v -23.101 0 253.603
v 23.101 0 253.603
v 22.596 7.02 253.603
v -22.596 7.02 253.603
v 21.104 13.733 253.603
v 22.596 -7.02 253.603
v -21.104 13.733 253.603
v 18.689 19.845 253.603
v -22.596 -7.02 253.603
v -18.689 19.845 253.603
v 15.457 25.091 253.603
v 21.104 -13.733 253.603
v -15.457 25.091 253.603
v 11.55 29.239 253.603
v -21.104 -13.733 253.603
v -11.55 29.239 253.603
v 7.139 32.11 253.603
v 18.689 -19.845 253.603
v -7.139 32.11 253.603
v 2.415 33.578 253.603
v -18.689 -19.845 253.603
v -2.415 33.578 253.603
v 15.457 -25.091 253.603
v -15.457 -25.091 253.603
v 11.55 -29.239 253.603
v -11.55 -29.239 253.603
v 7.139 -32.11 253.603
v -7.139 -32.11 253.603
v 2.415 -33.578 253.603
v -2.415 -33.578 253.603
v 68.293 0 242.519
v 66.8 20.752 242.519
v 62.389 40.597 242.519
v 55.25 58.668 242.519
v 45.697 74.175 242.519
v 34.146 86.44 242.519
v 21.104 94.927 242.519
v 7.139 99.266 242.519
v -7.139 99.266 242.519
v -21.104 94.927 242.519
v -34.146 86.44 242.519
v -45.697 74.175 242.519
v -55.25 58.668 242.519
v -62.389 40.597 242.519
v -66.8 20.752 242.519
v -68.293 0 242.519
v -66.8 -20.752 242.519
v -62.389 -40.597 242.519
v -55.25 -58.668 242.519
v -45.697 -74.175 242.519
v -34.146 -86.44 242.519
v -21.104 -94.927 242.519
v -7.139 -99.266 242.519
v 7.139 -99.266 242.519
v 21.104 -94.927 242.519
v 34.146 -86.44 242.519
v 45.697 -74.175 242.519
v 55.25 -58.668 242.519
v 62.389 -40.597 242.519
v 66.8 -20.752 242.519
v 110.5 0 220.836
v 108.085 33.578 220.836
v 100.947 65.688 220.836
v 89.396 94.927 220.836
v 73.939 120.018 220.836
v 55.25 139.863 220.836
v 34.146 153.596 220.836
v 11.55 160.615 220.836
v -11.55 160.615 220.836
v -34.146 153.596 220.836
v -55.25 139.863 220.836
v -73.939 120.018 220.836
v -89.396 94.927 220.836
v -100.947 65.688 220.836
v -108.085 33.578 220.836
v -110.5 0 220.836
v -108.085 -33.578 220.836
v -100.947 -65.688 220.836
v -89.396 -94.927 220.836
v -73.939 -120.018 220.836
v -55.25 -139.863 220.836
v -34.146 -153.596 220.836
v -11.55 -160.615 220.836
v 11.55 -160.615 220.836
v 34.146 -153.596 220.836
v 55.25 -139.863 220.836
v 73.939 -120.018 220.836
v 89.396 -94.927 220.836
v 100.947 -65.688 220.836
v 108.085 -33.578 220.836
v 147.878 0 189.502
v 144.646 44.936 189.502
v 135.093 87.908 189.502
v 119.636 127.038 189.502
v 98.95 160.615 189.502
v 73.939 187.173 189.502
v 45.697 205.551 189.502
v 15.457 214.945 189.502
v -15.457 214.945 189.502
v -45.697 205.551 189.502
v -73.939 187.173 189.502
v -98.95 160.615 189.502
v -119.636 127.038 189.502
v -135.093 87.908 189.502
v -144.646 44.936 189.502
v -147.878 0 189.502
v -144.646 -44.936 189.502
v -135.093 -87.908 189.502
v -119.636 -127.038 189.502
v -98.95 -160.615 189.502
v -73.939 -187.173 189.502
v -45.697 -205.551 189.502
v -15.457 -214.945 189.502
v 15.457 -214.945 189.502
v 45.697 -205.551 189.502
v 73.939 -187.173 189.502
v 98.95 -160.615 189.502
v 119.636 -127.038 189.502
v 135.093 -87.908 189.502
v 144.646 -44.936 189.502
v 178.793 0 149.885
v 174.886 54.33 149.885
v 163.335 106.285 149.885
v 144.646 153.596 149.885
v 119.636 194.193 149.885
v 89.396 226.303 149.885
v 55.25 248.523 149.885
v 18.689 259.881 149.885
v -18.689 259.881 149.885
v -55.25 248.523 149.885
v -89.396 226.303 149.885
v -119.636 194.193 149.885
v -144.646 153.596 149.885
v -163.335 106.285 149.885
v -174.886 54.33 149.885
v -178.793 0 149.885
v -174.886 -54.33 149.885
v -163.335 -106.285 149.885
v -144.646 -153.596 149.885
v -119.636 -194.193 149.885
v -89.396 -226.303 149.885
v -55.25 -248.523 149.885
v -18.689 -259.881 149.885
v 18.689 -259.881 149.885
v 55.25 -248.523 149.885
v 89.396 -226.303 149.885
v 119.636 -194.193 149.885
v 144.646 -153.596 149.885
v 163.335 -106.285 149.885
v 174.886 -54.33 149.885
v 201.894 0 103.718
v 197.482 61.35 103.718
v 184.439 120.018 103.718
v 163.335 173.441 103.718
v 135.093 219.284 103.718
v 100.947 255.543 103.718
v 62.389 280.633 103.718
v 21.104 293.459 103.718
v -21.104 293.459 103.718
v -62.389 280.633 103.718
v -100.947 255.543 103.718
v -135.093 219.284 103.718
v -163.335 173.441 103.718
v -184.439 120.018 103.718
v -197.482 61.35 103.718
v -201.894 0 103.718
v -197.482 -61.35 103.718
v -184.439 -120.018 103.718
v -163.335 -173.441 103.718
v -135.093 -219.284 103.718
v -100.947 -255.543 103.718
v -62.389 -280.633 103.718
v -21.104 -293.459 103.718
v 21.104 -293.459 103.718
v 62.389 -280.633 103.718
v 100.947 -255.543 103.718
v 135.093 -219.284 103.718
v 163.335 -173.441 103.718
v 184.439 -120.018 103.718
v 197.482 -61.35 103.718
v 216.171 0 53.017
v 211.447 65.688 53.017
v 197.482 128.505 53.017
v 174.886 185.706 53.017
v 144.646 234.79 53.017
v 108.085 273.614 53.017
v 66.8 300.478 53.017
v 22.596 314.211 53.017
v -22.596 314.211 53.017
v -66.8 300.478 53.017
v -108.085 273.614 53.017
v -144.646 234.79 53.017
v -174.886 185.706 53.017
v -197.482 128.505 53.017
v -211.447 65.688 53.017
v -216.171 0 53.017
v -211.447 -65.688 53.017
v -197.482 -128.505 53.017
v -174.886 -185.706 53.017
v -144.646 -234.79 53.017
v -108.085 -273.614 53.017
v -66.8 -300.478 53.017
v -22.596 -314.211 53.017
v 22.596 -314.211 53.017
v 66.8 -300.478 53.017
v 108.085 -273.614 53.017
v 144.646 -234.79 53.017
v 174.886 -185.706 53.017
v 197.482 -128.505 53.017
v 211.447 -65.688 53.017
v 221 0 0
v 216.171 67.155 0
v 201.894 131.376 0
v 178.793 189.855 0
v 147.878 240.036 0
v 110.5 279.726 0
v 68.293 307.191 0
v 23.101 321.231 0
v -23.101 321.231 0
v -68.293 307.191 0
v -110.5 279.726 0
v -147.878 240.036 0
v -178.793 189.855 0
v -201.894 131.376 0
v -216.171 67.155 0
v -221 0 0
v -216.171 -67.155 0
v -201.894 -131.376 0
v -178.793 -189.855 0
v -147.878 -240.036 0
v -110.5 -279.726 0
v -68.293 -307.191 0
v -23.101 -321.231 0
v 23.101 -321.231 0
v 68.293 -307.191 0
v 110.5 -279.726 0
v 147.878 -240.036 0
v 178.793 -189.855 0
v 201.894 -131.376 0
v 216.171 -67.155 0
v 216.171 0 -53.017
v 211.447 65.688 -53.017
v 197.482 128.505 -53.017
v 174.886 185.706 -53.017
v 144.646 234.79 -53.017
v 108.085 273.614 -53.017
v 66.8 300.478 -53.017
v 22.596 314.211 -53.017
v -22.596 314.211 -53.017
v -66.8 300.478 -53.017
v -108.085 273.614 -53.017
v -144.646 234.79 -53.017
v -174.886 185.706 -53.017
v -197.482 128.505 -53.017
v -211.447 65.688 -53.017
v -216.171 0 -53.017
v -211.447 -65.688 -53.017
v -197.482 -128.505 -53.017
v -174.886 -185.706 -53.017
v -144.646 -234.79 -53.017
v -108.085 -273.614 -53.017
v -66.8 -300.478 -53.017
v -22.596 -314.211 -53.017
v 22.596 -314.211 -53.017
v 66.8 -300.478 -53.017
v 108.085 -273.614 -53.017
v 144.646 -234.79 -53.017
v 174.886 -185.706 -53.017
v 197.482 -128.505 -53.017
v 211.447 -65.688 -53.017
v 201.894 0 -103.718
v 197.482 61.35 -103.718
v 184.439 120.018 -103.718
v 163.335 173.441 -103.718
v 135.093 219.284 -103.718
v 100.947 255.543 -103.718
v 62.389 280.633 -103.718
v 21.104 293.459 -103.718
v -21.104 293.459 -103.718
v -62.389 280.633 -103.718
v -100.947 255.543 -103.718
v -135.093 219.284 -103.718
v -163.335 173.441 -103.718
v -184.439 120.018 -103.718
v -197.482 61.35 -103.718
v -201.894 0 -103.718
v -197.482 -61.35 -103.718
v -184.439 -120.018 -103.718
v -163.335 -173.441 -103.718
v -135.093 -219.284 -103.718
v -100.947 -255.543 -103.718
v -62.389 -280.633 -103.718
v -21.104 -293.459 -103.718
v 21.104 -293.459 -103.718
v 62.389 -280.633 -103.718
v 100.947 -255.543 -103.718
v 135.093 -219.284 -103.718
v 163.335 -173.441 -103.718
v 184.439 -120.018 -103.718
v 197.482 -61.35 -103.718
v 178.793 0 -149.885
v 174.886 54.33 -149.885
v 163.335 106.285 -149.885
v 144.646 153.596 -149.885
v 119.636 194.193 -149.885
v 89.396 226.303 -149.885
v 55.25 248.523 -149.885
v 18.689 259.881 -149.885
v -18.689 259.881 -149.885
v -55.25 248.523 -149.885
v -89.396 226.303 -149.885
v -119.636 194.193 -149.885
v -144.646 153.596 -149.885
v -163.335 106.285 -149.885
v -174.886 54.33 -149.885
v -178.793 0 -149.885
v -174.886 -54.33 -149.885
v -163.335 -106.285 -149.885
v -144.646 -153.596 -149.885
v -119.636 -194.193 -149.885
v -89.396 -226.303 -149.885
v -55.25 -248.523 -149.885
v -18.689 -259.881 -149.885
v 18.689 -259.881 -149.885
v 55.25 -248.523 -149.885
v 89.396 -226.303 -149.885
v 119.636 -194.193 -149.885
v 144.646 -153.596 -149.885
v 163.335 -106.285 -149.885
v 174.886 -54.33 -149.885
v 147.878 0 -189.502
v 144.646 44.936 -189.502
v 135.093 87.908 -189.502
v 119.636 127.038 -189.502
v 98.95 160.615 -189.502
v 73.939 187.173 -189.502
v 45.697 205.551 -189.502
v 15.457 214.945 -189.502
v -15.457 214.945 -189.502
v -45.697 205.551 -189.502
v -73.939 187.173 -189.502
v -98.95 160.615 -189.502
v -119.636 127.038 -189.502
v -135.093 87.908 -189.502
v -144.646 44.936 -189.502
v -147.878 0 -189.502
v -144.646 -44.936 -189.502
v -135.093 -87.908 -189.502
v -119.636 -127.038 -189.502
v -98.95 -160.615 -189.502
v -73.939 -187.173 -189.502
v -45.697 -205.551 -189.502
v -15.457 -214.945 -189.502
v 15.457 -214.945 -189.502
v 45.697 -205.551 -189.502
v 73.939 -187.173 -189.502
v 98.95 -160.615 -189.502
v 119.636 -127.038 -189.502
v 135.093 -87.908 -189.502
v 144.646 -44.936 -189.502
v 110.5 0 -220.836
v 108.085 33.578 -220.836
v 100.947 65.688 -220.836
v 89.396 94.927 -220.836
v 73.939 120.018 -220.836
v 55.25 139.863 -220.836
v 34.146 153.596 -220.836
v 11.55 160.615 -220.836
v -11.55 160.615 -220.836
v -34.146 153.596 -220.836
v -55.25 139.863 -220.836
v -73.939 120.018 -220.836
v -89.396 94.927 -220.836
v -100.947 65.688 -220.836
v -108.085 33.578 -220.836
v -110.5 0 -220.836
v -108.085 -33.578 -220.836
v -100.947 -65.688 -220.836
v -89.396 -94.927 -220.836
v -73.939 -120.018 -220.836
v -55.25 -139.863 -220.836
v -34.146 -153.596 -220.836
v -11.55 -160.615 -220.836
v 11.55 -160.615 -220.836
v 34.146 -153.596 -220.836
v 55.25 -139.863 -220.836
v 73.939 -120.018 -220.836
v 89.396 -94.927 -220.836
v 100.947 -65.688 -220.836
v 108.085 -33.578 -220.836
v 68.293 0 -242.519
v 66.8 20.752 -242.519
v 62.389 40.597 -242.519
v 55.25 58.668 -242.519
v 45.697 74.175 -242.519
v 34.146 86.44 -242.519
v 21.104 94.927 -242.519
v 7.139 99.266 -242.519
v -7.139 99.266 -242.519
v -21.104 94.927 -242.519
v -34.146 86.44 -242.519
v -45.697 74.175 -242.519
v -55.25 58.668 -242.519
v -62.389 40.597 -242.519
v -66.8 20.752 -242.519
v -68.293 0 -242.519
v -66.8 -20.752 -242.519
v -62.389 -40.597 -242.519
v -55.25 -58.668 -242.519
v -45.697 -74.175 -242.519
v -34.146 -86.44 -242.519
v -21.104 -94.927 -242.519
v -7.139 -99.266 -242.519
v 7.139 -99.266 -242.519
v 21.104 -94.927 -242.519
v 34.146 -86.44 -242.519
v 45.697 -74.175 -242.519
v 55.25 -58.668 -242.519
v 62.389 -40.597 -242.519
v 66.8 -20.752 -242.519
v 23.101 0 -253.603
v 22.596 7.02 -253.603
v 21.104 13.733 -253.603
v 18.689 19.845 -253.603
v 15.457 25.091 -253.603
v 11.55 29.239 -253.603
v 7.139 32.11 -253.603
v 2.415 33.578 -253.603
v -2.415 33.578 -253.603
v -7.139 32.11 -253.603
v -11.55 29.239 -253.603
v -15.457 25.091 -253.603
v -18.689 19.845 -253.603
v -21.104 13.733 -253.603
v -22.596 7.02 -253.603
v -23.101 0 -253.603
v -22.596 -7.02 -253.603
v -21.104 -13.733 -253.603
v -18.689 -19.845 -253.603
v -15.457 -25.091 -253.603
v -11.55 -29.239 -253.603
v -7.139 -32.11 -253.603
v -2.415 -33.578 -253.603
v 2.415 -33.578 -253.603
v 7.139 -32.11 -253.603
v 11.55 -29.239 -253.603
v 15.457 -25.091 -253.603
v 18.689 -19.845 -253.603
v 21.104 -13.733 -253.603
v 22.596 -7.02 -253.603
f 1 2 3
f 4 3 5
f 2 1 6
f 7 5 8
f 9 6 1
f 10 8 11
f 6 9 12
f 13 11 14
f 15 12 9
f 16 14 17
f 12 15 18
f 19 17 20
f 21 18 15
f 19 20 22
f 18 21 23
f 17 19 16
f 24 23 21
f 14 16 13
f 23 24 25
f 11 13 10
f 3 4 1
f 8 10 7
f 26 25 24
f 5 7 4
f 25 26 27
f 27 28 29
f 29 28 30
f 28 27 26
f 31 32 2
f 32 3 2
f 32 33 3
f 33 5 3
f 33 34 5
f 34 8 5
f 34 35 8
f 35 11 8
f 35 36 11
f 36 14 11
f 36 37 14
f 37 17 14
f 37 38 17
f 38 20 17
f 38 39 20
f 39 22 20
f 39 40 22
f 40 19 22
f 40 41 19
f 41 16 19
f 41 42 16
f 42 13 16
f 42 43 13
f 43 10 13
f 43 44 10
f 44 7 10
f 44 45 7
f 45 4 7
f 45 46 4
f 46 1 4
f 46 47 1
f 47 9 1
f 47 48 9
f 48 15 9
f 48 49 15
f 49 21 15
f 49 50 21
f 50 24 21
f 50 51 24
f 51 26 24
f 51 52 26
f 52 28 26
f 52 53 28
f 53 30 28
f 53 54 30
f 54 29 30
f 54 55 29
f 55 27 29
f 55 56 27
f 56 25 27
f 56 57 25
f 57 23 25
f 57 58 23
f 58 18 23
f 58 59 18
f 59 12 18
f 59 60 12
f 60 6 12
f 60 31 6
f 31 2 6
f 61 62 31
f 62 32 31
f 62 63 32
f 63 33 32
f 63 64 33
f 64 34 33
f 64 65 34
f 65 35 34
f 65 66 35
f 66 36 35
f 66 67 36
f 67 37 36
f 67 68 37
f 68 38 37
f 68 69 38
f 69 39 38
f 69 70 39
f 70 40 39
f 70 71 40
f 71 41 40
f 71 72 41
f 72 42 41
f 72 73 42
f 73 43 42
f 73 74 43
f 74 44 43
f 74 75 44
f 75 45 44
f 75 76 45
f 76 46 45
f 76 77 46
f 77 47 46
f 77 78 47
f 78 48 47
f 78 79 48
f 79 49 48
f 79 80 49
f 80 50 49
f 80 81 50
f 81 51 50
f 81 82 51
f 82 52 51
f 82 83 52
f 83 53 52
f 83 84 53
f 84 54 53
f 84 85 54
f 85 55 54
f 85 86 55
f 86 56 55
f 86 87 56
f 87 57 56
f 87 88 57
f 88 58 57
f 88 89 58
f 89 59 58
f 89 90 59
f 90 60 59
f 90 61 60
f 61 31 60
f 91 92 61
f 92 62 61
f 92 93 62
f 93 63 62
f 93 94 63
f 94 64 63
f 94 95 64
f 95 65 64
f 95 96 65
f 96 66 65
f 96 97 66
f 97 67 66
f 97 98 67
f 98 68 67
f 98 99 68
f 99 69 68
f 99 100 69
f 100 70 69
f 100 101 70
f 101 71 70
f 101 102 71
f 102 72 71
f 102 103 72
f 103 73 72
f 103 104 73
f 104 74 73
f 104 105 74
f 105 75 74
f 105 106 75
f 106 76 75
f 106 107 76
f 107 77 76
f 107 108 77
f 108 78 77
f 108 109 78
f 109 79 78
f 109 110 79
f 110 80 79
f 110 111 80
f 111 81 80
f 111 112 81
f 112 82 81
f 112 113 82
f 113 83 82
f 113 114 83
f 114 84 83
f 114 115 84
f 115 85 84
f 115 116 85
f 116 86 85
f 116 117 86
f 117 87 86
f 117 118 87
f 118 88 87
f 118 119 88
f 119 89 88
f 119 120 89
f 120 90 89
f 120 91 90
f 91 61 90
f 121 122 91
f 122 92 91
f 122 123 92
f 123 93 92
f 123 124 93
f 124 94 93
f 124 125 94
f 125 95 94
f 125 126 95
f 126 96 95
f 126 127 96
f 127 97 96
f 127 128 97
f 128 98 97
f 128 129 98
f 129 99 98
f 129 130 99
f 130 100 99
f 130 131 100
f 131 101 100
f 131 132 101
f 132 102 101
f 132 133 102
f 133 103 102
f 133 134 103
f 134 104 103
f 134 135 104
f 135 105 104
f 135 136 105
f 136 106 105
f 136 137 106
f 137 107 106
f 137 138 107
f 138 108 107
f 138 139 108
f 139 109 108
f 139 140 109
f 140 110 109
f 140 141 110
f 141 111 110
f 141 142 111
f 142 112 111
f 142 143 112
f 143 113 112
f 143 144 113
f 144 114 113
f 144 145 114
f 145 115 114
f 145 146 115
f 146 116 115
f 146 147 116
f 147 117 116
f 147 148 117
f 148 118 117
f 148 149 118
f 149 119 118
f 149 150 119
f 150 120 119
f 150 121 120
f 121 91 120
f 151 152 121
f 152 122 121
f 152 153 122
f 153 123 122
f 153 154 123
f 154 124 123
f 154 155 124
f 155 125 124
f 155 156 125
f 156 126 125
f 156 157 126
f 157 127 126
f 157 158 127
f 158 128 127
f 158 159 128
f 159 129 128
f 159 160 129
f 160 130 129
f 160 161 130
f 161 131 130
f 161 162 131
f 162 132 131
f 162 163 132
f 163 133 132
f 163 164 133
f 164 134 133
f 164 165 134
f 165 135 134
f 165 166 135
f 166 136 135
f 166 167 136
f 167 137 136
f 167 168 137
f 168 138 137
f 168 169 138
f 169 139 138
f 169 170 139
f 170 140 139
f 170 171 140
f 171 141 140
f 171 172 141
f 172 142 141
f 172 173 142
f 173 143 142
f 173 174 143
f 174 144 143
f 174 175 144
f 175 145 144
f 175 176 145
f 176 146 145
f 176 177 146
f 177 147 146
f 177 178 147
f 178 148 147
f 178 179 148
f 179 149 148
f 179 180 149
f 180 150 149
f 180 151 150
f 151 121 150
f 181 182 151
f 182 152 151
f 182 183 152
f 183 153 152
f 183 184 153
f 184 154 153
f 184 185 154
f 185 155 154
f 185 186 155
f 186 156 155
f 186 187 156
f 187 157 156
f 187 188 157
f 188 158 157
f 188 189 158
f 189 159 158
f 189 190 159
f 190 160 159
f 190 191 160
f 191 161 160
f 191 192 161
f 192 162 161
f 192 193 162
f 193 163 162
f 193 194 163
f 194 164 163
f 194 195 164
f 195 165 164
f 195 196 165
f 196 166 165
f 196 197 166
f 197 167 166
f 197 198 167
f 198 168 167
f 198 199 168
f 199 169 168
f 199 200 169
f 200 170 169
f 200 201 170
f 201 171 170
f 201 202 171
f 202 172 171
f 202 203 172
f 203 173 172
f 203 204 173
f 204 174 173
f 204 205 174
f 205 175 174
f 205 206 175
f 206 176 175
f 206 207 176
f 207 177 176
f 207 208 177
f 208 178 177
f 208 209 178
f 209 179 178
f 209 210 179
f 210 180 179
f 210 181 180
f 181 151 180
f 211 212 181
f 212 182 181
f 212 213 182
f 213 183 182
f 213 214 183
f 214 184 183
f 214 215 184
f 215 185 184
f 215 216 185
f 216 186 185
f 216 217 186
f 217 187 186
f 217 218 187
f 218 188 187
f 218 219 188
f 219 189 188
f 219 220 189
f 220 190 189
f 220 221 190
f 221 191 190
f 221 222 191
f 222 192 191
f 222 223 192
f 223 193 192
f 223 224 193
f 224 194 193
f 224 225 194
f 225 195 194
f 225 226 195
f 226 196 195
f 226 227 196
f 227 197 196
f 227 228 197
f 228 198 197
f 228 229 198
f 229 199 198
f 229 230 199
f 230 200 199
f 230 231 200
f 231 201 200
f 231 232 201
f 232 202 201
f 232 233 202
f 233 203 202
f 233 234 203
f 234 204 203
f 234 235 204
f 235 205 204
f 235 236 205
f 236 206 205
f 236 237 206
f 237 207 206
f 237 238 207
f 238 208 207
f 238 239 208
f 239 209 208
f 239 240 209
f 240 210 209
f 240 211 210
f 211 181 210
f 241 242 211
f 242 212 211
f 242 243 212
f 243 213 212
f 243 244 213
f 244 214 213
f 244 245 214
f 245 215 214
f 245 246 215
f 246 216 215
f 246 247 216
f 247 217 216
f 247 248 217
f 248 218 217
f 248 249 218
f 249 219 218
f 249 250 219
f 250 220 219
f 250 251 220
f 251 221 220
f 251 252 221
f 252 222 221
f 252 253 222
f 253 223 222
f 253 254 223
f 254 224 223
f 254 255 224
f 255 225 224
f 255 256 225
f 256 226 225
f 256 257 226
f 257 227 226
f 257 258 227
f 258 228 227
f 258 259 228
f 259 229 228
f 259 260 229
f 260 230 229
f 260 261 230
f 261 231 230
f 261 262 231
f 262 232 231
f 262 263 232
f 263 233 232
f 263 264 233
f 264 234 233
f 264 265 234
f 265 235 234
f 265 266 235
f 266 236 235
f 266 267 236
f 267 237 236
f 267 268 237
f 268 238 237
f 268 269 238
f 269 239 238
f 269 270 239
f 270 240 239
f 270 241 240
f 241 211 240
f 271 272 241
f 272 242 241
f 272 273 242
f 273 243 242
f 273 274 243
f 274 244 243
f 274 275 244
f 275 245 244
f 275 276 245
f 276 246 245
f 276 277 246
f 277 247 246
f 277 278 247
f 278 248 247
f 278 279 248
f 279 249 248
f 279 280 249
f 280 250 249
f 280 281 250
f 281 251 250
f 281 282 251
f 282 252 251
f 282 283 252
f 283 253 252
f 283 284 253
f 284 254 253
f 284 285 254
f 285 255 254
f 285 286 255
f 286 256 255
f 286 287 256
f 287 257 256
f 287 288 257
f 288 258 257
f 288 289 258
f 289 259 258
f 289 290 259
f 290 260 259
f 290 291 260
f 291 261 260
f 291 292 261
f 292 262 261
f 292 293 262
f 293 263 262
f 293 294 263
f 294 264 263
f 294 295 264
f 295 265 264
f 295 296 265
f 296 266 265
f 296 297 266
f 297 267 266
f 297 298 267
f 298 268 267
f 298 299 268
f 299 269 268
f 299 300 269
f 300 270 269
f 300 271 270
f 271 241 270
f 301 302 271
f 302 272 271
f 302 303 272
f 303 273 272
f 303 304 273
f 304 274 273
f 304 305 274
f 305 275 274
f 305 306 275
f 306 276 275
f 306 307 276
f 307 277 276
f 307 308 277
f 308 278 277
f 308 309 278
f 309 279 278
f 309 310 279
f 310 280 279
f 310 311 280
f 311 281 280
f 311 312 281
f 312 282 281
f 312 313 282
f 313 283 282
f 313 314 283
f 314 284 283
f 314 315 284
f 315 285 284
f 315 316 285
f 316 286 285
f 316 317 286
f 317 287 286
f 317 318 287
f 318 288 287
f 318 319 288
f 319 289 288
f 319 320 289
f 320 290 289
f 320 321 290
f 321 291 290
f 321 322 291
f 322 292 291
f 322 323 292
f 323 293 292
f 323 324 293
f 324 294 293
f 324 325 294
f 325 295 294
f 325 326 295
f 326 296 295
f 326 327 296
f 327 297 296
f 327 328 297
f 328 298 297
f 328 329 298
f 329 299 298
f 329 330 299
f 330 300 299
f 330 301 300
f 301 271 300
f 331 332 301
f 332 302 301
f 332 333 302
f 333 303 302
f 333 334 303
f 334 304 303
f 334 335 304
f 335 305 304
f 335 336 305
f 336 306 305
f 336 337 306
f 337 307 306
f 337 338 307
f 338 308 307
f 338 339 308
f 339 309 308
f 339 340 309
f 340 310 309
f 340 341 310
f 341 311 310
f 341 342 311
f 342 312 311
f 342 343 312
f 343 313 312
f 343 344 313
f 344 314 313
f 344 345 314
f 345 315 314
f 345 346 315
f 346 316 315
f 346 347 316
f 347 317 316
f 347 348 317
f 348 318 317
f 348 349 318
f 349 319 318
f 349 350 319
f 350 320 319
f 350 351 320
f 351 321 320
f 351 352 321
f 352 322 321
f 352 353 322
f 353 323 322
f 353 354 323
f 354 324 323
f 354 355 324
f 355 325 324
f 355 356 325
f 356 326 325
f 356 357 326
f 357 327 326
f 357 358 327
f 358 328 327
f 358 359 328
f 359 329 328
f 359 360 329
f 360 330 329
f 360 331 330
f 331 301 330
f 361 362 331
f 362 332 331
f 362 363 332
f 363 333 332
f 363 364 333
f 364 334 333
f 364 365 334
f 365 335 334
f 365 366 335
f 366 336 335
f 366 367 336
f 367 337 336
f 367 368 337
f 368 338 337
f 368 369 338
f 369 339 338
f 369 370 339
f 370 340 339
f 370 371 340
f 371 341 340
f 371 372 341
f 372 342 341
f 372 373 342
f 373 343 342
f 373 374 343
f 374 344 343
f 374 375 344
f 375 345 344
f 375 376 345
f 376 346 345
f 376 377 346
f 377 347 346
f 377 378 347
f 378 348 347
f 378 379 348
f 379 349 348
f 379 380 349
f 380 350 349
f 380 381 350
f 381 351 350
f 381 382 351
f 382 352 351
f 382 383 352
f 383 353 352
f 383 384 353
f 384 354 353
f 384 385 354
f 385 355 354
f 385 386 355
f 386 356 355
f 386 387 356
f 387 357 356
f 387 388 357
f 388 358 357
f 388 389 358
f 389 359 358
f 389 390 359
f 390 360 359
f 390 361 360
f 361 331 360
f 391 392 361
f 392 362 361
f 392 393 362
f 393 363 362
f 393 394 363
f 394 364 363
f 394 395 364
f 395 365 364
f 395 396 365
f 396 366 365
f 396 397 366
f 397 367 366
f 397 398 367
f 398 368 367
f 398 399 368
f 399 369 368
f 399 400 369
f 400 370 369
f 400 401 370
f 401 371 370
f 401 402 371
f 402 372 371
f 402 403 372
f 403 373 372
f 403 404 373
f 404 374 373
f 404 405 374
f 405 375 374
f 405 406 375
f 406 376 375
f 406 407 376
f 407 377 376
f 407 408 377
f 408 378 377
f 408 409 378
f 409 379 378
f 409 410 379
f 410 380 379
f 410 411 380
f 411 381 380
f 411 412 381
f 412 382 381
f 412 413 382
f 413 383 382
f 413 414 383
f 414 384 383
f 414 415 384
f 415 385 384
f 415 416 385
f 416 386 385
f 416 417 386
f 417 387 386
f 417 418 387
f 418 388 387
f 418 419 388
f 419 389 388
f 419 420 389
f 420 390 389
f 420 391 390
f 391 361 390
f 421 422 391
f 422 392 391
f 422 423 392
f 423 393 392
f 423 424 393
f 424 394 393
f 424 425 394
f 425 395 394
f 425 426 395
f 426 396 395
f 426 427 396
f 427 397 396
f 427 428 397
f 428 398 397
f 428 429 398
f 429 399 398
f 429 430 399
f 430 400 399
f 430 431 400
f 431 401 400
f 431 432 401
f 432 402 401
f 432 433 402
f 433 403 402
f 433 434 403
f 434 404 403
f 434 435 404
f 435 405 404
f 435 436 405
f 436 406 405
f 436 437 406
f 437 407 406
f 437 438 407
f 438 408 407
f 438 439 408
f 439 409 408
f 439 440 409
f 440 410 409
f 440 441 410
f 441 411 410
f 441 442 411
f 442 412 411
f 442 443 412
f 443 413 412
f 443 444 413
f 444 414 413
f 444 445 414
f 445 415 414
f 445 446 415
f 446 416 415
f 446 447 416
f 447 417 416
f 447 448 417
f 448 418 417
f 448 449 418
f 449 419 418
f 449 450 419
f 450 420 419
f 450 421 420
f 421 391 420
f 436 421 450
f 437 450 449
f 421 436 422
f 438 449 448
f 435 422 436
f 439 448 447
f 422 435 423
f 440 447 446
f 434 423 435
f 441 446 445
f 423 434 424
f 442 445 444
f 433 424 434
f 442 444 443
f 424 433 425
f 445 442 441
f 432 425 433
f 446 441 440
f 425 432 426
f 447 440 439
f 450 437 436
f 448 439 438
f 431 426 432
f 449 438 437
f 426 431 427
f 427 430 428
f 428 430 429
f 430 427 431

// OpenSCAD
// Generated by SolidPython 1.0.1 on 2020-07-29 00:46:51


scale(v = [13, 19, 15]) {
	sphere(r = 17);
}
/***********************************************
*********      SolidPython code:      **********
************************************************
 
# import packages: SolidPython
from solid import *
from solid.utils import *
from itertools import chain, combinations, permutations


class Resize:

    def __init__(self, scad_file):
        self.scad_file = scad_file
        #self.scad_file = import_scad(scad_file)
        # cone/cylinder param:
        self.r1 = 0
        self.r2 = 0
        self.h = 0
        # rectangular prism param:
        self.w = 0
        self.l = 0
        # ellipse param:
        self.r = 0

    # import OpenScad code (file name corresponds to shape)


    # classify shape + parameters
    def assign(self, param1, param2, param3):
        if self.scad_file == 'cone.scad':
            self.r1 = param1
            self.r2 = param2
            self.h = param3
        elif self.scad_file == 'cylinder.scad':
            self.r1 = param1
            self.r2 = param2
            self.h = param3
        elif self.scad_file == 'rectangularPrism.scad':
            self.h = param1
            self.l = param2
            self.w = param3
        else:
            self.r = param1
            self.h = param2

    # resize parameters
    def iterate(self):
        x = range(3, 20, 2)
        i = 1
        if self.scad_file == 'cone.scad':
            tempList = list(permutations(x, 2))
            for temp in tempList:
                param1 = temp[0]
                param2 = temp[1]
                filepath = 'produced_scad_files/' + 'cone' + str(param1) + '_' + str(param2) + '_' + '.scad'
                scad_render_to_file(cylinder(h=param1, r1=param2, r2=0), filepath)

        elif self.scad_file == 'cylinder.scad':
            tempList = list(permutations(x, 3))
            for temp in tempList:
                param1 = temp[0]
                param2 = temp[1]
                filepath = 'produced_scad_files/' + 'cylinder' + str(param1) + '_' + str(param2) + '_' + '.scad'
                scad_render_to_file(cylinder(h=param1, r1=param2, r2=param2), filepath)

        elif self.scad_file == 'rectangularPrism.scad':
            tempList = list(permutations(x, 3))
            for temp in tempList:
                param1 = temp[0]
                param2 = temp[1]
                param3 = temp[2]
                filepath = 'produced_scad_files/' + 'rectangularPrism' + str(param1) + '_' + str(param2) + '_' + str(
                    param3) + '.scad'
                scad_render_to_file(cube(size=(param1, param2, param3)), filepath)

        elif self.scad_file == 'ellipse.scad':
            tempList = list(permutations(x, 4))
            for temp in tempList:
                param1 = temp[0]
                param2 = temp[1]
                param3 = temp[2]
                param4 = temp[3]
                filepath = 'produced_scad_files/' + 'ellipse' + str(param1) + '_' + str(param2) + '_' + str(param3) + '_' + str(param4) + '.scad'
                scad_render_to_file(scale([param1, param2, param3])(sphere(r=param4)), filepath)

    def render_to_scadfile(self):
        scad_render_to_file(scad, 'example.scad') 
 
************************************************/
